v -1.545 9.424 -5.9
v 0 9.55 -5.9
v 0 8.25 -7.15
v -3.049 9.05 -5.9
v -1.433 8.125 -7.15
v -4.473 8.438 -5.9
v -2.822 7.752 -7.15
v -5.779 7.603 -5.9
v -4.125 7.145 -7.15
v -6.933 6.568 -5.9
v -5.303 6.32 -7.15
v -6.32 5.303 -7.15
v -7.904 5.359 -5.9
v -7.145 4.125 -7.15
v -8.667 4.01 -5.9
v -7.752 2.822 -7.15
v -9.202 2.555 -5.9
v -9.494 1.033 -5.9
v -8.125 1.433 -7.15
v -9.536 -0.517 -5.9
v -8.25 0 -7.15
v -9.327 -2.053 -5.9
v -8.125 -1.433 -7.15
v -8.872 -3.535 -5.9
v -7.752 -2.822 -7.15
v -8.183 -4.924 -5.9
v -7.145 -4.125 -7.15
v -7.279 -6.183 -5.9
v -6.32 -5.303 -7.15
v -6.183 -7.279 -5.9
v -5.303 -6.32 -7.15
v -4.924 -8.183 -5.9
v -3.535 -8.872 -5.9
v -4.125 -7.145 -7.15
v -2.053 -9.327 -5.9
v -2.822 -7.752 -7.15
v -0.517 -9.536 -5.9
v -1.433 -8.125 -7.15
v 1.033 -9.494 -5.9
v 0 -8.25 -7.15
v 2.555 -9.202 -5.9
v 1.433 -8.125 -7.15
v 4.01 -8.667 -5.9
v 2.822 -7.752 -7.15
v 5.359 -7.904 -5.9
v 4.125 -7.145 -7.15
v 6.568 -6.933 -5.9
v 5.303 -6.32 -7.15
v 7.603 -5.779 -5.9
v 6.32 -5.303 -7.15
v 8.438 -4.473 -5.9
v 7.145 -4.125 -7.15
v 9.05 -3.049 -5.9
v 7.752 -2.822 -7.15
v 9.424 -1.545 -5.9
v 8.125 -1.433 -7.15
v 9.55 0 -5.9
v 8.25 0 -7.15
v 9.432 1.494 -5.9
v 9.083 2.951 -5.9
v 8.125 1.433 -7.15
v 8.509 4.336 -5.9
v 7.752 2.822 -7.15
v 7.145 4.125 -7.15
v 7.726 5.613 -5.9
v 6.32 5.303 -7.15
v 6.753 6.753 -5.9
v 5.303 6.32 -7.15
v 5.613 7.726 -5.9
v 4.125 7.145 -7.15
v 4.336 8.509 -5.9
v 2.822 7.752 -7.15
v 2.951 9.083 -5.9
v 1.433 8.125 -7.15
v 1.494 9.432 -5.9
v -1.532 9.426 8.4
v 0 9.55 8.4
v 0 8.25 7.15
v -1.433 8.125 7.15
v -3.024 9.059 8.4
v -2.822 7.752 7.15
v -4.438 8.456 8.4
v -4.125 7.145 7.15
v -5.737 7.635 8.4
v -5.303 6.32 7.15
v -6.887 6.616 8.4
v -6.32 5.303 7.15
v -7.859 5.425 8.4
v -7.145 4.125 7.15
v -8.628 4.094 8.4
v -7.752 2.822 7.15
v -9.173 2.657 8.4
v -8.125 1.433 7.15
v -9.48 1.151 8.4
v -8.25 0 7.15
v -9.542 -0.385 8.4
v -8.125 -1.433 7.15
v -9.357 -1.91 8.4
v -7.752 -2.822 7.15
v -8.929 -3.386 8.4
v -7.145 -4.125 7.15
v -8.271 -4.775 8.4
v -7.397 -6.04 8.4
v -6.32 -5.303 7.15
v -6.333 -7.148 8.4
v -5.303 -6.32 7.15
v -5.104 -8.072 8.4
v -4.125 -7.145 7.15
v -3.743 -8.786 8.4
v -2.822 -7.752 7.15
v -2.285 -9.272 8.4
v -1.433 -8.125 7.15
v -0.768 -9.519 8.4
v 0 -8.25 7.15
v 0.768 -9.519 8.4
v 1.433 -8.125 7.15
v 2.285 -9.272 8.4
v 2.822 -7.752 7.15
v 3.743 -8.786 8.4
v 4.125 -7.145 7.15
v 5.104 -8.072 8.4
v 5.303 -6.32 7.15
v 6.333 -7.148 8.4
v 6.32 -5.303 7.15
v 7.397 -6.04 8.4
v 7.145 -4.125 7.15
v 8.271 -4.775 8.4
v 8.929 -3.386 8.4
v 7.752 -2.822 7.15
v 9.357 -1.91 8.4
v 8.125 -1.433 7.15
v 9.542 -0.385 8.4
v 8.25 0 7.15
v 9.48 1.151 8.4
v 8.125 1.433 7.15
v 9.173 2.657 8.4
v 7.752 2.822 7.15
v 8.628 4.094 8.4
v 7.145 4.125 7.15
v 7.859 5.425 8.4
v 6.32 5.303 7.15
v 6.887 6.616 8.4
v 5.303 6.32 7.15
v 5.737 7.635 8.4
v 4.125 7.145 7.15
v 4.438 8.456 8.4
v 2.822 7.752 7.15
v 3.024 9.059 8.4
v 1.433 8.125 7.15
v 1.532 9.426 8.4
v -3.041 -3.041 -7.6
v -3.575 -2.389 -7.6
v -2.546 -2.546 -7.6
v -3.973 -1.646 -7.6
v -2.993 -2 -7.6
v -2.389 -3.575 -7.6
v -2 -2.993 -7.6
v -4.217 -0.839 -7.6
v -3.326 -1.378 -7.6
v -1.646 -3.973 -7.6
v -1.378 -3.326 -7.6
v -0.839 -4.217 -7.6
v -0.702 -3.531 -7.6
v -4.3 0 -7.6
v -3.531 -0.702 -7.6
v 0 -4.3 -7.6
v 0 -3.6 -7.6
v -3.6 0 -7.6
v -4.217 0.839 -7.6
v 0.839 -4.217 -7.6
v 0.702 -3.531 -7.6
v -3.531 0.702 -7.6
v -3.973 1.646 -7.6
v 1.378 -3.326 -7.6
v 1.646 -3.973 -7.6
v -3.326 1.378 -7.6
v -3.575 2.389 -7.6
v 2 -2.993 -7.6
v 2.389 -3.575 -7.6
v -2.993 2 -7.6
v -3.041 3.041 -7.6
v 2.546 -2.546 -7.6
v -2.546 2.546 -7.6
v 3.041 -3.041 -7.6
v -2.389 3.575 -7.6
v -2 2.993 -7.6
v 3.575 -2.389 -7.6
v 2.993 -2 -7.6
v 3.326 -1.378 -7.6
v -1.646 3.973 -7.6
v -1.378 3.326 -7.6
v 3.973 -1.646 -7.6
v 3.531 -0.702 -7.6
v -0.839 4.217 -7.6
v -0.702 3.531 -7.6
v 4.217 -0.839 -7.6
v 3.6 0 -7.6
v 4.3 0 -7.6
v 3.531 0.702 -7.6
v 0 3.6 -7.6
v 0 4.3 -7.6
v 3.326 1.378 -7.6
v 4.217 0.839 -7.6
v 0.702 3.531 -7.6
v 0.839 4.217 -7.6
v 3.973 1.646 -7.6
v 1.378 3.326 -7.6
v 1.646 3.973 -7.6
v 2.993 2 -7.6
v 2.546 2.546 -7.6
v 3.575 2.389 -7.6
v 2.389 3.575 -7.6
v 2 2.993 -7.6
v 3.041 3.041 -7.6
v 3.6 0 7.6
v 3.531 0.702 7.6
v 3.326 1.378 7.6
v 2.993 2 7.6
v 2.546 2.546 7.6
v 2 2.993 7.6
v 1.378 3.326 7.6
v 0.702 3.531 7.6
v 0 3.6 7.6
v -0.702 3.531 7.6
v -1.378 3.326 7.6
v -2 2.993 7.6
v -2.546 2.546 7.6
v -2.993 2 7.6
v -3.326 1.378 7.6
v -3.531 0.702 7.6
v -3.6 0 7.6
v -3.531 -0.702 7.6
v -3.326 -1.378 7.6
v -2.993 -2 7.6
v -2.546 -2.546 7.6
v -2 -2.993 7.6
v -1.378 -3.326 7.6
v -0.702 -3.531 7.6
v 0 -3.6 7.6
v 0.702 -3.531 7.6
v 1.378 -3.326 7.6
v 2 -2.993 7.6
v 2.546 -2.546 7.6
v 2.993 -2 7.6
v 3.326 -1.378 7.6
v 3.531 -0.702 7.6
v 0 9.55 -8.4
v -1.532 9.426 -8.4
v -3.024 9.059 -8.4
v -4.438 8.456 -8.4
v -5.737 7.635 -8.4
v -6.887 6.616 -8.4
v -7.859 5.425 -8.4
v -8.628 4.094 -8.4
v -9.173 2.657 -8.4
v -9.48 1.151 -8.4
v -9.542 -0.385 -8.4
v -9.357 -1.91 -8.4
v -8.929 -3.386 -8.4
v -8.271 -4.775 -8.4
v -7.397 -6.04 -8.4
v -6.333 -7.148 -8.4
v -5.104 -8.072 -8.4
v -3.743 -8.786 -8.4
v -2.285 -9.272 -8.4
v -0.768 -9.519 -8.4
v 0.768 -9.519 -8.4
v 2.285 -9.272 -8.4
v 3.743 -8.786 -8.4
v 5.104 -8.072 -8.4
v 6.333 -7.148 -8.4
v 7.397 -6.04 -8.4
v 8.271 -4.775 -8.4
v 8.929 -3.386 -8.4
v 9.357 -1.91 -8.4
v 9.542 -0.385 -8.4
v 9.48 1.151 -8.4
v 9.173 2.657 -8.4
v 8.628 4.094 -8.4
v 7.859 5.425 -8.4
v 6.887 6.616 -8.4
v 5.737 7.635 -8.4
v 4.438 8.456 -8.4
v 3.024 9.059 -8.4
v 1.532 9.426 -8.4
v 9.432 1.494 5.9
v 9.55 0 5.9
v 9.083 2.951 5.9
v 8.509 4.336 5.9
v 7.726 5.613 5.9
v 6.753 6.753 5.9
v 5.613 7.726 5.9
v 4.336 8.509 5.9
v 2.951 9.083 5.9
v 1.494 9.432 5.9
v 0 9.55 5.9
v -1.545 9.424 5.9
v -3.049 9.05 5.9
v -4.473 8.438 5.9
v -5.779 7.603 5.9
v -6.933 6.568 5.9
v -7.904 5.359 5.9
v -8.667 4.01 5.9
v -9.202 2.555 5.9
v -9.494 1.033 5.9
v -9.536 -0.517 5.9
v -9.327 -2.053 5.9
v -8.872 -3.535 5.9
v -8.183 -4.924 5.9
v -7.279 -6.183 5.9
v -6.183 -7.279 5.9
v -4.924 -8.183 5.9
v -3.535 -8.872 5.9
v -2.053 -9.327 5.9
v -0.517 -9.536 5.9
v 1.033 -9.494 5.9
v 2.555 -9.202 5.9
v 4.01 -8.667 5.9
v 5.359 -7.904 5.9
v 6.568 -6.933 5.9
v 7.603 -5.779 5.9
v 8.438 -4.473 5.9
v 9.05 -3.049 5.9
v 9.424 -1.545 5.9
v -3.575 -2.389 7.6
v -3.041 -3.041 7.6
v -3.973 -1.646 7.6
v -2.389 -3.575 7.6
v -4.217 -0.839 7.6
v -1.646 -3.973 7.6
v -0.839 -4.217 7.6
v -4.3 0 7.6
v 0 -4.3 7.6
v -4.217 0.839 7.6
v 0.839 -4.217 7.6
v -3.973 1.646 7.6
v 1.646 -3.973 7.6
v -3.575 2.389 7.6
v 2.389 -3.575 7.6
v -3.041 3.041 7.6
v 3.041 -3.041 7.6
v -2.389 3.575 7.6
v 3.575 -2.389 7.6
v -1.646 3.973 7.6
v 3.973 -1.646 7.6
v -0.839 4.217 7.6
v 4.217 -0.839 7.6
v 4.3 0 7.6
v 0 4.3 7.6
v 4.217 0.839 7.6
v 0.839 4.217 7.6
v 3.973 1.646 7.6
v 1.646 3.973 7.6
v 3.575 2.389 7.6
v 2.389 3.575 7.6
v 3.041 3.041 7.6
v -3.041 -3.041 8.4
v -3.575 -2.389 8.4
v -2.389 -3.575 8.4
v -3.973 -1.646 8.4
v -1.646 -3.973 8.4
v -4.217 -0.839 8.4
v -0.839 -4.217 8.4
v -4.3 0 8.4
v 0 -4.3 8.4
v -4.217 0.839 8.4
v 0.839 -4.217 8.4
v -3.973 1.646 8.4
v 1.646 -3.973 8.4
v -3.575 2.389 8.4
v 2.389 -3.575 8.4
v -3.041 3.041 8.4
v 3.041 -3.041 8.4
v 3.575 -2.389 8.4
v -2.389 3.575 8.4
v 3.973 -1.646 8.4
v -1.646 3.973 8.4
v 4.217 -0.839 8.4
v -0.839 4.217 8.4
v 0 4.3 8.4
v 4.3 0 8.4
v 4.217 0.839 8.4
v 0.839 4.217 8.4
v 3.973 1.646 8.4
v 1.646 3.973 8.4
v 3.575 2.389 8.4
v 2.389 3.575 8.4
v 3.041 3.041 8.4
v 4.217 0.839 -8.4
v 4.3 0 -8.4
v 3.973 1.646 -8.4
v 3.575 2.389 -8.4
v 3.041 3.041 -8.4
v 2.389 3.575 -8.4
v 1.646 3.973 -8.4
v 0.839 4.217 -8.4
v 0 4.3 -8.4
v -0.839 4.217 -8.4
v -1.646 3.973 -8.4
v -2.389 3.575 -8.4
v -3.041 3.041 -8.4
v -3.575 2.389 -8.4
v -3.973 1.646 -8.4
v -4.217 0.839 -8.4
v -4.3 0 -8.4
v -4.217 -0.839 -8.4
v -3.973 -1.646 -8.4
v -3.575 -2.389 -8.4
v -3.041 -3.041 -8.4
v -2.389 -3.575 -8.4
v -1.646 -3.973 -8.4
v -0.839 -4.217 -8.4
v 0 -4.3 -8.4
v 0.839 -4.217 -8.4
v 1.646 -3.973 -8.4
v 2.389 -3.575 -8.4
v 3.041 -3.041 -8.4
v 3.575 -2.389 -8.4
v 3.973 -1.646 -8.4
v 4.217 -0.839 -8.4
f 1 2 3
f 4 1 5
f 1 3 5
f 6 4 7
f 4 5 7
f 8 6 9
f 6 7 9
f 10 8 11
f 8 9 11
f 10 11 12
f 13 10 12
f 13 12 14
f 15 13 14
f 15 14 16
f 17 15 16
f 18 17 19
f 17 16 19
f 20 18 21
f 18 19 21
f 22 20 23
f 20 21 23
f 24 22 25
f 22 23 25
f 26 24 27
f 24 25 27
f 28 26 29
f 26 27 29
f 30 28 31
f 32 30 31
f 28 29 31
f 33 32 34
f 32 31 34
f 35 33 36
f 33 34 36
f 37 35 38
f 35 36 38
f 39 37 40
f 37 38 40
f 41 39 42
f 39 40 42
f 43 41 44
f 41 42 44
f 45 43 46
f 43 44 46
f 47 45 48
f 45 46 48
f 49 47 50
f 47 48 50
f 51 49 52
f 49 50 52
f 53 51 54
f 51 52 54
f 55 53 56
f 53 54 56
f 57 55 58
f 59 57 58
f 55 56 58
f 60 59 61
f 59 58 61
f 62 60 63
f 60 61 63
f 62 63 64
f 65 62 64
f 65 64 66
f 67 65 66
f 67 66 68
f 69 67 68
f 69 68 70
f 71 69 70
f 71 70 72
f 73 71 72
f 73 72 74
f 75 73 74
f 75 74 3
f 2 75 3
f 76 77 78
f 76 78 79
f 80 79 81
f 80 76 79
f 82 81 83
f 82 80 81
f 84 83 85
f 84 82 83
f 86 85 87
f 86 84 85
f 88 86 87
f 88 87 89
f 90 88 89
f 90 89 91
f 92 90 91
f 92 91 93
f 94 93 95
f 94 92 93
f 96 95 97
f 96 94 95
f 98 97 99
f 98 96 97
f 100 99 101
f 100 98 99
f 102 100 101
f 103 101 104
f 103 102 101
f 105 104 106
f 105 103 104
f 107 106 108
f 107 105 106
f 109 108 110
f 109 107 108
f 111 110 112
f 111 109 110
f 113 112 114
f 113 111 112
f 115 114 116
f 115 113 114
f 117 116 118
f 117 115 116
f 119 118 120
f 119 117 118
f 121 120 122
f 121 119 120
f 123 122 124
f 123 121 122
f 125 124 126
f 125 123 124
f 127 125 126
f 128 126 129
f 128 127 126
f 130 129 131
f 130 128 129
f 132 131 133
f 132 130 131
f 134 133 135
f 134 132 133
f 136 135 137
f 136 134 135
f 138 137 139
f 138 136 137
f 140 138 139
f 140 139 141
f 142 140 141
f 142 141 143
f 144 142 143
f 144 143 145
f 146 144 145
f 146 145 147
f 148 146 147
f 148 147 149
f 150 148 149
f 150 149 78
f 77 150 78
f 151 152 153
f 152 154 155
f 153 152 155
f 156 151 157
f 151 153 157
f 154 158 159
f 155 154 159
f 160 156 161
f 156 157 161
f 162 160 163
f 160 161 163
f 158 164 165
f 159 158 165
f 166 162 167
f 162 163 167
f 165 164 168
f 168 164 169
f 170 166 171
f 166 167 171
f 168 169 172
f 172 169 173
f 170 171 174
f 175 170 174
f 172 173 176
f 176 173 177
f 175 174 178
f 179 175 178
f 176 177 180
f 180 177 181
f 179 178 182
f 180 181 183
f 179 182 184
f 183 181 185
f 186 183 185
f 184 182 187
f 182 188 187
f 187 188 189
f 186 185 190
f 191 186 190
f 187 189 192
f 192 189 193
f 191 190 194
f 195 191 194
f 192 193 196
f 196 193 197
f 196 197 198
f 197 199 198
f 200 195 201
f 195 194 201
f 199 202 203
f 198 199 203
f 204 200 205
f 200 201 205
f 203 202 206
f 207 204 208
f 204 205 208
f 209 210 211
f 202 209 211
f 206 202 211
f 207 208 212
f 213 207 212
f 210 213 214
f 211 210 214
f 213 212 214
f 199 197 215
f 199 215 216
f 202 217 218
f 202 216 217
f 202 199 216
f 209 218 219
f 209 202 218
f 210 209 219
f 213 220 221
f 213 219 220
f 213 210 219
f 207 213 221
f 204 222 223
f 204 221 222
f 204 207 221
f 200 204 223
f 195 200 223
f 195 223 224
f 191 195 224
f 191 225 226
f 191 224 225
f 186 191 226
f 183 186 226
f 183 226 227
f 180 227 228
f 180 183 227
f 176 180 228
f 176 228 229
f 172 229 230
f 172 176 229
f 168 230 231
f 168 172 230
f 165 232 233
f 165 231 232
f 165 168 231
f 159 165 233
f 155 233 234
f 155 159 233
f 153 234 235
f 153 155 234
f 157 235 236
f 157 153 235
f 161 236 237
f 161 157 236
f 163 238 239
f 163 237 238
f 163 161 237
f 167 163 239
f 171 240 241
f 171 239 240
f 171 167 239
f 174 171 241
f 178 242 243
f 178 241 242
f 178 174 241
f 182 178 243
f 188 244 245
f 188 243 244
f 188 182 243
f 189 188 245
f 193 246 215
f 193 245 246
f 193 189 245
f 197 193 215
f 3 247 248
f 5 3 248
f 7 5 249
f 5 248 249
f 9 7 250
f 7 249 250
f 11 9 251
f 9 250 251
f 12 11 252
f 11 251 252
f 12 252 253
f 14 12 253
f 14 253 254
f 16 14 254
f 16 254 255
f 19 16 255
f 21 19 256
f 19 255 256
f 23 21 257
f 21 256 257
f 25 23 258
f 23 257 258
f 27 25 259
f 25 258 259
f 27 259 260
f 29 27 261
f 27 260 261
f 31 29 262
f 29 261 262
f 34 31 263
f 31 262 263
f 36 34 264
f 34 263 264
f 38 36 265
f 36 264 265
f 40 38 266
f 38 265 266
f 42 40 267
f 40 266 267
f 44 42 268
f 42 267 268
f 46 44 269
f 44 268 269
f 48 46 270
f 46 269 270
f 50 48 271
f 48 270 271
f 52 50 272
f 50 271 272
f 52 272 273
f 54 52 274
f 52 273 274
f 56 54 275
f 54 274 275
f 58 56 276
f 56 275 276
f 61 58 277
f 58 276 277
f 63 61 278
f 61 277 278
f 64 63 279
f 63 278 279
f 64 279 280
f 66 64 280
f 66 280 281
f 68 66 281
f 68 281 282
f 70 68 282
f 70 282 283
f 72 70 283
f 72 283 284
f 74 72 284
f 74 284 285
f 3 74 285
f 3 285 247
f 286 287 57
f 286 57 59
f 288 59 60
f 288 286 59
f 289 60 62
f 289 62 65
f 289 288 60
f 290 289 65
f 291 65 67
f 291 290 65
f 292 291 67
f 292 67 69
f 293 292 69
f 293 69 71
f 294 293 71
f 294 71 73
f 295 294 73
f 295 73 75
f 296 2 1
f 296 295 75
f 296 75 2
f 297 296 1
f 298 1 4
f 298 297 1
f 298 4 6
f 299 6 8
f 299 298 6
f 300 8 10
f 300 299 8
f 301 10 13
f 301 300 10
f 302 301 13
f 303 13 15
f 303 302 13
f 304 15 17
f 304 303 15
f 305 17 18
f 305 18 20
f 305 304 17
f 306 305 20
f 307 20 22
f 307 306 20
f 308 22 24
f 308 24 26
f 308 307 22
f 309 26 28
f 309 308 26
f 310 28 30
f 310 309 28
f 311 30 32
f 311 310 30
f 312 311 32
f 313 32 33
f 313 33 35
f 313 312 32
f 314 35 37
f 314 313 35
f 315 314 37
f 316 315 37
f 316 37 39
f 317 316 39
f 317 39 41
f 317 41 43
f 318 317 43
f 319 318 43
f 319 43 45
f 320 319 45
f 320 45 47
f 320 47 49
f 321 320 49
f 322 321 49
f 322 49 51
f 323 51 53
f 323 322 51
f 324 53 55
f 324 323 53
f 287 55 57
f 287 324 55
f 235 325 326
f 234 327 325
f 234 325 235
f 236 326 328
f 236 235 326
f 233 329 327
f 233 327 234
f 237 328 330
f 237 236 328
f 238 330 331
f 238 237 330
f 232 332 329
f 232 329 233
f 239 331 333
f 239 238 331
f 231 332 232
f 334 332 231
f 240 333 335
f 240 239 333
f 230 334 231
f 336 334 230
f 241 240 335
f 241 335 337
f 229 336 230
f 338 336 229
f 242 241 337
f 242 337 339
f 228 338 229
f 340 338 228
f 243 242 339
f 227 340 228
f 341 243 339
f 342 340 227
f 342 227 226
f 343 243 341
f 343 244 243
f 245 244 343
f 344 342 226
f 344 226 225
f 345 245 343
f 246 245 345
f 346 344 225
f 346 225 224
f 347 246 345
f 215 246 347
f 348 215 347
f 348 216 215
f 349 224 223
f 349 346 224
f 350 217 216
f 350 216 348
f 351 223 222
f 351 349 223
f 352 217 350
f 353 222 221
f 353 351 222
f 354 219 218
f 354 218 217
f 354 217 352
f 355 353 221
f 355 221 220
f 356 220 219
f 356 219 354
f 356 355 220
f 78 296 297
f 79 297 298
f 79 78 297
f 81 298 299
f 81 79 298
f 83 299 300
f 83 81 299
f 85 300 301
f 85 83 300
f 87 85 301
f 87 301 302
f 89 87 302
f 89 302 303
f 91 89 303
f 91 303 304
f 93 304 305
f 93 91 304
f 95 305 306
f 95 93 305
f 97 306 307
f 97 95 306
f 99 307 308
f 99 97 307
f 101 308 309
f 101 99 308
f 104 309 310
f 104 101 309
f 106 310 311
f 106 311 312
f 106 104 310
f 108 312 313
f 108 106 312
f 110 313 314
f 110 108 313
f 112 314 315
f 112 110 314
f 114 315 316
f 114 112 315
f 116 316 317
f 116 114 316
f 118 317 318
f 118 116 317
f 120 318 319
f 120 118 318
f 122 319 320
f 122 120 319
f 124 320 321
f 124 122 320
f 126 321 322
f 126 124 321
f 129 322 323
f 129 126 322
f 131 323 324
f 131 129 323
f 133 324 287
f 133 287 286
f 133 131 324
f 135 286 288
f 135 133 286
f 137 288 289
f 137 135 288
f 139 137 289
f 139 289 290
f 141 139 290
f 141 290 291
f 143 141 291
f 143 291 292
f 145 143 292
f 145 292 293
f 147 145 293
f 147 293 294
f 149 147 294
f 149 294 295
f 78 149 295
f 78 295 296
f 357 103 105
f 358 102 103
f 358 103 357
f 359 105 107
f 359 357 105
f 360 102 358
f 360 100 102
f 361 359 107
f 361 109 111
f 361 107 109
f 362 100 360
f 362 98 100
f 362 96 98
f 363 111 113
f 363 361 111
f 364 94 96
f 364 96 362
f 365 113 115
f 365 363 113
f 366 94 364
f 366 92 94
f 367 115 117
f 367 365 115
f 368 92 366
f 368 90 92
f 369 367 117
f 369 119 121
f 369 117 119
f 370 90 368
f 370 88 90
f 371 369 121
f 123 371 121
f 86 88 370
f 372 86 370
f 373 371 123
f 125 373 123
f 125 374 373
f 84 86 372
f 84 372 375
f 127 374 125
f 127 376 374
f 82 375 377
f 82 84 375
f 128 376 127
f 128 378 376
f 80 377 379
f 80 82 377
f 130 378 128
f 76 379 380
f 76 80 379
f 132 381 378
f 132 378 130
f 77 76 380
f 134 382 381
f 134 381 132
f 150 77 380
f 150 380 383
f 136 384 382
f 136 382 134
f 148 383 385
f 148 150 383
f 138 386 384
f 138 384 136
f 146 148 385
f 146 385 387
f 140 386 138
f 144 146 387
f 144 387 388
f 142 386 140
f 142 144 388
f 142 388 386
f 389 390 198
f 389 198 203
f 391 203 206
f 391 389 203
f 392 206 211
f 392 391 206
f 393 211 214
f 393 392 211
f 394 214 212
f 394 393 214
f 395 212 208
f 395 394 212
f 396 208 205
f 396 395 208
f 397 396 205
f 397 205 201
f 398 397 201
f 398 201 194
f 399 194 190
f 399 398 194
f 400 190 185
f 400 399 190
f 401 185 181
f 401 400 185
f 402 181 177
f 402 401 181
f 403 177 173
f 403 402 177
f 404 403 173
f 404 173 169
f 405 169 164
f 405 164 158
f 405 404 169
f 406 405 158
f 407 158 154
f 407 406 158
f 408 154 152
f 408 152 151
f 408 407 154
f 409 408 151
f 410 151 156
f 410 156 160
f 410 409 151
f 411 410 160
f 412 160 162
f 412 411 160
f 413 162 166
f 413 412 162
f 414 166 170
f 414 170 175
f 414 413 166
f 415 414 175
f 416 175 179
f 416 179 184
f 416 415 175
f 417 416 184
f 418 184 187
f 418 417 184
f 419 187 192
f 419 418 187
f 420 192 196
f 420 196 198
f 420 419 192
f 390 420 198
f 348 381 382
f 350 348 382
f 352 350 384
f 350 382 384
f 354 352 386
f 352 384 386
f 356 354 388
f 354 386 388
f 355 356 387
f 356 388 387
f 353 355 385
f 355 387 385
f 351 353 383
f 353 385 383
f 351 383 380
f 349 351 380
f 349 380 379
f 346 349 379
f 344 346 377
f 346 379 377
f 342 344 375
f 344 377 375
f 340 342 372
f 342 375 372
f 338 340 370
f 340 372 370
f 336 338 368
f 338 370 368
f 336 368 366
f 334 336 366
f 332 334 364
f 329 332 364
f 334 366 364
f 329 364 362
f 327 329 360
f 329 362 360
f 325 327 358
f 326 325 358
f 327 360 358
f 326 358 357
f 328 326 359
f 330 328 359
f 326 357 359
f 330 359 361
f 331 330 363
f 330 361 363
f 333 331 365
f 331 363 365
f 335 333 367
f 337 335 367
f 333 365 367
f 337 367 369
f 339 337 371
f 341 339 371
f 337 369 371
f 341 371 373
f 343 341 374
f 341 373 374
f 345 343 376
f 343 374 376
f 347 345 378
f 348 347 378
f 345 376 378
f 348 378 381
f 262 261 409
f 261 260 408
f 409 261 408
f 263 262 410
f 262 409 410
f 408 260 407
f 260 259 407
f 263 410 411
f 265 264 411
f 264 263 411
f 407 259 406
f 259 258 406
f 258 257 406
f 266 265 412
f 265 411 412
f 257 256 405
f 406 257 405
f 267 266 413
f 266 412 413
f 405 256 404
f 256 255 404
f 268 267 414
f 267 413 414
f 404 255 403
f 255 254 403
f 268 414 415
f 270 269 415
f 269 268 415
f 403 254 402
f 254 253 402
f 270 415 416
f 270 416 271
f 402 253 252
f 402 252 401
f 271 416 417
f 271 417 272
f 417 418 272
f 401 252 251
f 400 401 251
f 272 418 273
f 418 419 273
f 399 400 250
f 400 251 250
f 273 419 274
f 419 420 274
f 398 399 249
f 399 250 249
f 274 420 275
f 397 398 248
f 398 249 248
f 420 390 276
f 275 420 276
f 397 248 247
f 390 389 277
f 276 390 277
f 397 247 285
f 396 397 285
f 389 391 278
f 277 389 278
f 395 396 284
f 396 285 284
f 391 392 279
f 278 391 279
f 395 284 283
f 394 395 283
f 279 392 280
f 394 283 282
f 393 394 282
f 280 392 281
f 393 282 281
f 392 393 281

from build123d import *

# Parameters (mm, degrees)
SKETCH_1_R          = 9.55
SKETCH_1_R_2        = 3.6
EXTRUDE_1_DEPTH     = 8.4
SKETCH_2_R          = 4.3
CUT_EXTRUDE_1_DEPTH = 0.8


with BuildPart() as part:
    # 스케치1 → 보스-돌출1 (new body, symmetric)
    with BuildSketch(Plane.XY):
        Circle(SKETCH_1_R)
        Circle(SKETCH_1_R_2, mode=Mode.SUBTRACT)
    extrude(amount=EXTRUDE_1_DEPTH, both=True)

    # 스케치2 → 컷-돌출1 (cut)
    with BuildSketch(Plane.XY.offset(8.4)):
        Circle(SKETCH_2_R)
    cut_extrude_1 = extrude(amount=-CUT_EXTRUDE_1_DEPTH, mode=Mode.SUBTRACT)

    # 스케치3 → 컷-회전1 (revolve, cut)
    with BuildSketch(Plane(origin=(0, 0, 0), x_dir=(0, 0, -1), z_dir=(1, 0, 0))):
        Polygon((-8.4, 9.55), (-5.9, 9.55), (-7.15, 8.25), align=None)
    cut_revolve_1 = revolve(axis=Axis((0, 0, 0), (0, 0, 1)), mode=Mode.SUBTRACT)

    # 대칭 복사1: 컷-돌출1, 컷-회전1 across plane
    add(cut_extrude_1.mirror(Plane.XY), mode=Mode.SUBTRACT)
    add(cut_revolve_1.mirror(Plane.XY), mode=Mode.SUBTRACT)


solid = part.part
